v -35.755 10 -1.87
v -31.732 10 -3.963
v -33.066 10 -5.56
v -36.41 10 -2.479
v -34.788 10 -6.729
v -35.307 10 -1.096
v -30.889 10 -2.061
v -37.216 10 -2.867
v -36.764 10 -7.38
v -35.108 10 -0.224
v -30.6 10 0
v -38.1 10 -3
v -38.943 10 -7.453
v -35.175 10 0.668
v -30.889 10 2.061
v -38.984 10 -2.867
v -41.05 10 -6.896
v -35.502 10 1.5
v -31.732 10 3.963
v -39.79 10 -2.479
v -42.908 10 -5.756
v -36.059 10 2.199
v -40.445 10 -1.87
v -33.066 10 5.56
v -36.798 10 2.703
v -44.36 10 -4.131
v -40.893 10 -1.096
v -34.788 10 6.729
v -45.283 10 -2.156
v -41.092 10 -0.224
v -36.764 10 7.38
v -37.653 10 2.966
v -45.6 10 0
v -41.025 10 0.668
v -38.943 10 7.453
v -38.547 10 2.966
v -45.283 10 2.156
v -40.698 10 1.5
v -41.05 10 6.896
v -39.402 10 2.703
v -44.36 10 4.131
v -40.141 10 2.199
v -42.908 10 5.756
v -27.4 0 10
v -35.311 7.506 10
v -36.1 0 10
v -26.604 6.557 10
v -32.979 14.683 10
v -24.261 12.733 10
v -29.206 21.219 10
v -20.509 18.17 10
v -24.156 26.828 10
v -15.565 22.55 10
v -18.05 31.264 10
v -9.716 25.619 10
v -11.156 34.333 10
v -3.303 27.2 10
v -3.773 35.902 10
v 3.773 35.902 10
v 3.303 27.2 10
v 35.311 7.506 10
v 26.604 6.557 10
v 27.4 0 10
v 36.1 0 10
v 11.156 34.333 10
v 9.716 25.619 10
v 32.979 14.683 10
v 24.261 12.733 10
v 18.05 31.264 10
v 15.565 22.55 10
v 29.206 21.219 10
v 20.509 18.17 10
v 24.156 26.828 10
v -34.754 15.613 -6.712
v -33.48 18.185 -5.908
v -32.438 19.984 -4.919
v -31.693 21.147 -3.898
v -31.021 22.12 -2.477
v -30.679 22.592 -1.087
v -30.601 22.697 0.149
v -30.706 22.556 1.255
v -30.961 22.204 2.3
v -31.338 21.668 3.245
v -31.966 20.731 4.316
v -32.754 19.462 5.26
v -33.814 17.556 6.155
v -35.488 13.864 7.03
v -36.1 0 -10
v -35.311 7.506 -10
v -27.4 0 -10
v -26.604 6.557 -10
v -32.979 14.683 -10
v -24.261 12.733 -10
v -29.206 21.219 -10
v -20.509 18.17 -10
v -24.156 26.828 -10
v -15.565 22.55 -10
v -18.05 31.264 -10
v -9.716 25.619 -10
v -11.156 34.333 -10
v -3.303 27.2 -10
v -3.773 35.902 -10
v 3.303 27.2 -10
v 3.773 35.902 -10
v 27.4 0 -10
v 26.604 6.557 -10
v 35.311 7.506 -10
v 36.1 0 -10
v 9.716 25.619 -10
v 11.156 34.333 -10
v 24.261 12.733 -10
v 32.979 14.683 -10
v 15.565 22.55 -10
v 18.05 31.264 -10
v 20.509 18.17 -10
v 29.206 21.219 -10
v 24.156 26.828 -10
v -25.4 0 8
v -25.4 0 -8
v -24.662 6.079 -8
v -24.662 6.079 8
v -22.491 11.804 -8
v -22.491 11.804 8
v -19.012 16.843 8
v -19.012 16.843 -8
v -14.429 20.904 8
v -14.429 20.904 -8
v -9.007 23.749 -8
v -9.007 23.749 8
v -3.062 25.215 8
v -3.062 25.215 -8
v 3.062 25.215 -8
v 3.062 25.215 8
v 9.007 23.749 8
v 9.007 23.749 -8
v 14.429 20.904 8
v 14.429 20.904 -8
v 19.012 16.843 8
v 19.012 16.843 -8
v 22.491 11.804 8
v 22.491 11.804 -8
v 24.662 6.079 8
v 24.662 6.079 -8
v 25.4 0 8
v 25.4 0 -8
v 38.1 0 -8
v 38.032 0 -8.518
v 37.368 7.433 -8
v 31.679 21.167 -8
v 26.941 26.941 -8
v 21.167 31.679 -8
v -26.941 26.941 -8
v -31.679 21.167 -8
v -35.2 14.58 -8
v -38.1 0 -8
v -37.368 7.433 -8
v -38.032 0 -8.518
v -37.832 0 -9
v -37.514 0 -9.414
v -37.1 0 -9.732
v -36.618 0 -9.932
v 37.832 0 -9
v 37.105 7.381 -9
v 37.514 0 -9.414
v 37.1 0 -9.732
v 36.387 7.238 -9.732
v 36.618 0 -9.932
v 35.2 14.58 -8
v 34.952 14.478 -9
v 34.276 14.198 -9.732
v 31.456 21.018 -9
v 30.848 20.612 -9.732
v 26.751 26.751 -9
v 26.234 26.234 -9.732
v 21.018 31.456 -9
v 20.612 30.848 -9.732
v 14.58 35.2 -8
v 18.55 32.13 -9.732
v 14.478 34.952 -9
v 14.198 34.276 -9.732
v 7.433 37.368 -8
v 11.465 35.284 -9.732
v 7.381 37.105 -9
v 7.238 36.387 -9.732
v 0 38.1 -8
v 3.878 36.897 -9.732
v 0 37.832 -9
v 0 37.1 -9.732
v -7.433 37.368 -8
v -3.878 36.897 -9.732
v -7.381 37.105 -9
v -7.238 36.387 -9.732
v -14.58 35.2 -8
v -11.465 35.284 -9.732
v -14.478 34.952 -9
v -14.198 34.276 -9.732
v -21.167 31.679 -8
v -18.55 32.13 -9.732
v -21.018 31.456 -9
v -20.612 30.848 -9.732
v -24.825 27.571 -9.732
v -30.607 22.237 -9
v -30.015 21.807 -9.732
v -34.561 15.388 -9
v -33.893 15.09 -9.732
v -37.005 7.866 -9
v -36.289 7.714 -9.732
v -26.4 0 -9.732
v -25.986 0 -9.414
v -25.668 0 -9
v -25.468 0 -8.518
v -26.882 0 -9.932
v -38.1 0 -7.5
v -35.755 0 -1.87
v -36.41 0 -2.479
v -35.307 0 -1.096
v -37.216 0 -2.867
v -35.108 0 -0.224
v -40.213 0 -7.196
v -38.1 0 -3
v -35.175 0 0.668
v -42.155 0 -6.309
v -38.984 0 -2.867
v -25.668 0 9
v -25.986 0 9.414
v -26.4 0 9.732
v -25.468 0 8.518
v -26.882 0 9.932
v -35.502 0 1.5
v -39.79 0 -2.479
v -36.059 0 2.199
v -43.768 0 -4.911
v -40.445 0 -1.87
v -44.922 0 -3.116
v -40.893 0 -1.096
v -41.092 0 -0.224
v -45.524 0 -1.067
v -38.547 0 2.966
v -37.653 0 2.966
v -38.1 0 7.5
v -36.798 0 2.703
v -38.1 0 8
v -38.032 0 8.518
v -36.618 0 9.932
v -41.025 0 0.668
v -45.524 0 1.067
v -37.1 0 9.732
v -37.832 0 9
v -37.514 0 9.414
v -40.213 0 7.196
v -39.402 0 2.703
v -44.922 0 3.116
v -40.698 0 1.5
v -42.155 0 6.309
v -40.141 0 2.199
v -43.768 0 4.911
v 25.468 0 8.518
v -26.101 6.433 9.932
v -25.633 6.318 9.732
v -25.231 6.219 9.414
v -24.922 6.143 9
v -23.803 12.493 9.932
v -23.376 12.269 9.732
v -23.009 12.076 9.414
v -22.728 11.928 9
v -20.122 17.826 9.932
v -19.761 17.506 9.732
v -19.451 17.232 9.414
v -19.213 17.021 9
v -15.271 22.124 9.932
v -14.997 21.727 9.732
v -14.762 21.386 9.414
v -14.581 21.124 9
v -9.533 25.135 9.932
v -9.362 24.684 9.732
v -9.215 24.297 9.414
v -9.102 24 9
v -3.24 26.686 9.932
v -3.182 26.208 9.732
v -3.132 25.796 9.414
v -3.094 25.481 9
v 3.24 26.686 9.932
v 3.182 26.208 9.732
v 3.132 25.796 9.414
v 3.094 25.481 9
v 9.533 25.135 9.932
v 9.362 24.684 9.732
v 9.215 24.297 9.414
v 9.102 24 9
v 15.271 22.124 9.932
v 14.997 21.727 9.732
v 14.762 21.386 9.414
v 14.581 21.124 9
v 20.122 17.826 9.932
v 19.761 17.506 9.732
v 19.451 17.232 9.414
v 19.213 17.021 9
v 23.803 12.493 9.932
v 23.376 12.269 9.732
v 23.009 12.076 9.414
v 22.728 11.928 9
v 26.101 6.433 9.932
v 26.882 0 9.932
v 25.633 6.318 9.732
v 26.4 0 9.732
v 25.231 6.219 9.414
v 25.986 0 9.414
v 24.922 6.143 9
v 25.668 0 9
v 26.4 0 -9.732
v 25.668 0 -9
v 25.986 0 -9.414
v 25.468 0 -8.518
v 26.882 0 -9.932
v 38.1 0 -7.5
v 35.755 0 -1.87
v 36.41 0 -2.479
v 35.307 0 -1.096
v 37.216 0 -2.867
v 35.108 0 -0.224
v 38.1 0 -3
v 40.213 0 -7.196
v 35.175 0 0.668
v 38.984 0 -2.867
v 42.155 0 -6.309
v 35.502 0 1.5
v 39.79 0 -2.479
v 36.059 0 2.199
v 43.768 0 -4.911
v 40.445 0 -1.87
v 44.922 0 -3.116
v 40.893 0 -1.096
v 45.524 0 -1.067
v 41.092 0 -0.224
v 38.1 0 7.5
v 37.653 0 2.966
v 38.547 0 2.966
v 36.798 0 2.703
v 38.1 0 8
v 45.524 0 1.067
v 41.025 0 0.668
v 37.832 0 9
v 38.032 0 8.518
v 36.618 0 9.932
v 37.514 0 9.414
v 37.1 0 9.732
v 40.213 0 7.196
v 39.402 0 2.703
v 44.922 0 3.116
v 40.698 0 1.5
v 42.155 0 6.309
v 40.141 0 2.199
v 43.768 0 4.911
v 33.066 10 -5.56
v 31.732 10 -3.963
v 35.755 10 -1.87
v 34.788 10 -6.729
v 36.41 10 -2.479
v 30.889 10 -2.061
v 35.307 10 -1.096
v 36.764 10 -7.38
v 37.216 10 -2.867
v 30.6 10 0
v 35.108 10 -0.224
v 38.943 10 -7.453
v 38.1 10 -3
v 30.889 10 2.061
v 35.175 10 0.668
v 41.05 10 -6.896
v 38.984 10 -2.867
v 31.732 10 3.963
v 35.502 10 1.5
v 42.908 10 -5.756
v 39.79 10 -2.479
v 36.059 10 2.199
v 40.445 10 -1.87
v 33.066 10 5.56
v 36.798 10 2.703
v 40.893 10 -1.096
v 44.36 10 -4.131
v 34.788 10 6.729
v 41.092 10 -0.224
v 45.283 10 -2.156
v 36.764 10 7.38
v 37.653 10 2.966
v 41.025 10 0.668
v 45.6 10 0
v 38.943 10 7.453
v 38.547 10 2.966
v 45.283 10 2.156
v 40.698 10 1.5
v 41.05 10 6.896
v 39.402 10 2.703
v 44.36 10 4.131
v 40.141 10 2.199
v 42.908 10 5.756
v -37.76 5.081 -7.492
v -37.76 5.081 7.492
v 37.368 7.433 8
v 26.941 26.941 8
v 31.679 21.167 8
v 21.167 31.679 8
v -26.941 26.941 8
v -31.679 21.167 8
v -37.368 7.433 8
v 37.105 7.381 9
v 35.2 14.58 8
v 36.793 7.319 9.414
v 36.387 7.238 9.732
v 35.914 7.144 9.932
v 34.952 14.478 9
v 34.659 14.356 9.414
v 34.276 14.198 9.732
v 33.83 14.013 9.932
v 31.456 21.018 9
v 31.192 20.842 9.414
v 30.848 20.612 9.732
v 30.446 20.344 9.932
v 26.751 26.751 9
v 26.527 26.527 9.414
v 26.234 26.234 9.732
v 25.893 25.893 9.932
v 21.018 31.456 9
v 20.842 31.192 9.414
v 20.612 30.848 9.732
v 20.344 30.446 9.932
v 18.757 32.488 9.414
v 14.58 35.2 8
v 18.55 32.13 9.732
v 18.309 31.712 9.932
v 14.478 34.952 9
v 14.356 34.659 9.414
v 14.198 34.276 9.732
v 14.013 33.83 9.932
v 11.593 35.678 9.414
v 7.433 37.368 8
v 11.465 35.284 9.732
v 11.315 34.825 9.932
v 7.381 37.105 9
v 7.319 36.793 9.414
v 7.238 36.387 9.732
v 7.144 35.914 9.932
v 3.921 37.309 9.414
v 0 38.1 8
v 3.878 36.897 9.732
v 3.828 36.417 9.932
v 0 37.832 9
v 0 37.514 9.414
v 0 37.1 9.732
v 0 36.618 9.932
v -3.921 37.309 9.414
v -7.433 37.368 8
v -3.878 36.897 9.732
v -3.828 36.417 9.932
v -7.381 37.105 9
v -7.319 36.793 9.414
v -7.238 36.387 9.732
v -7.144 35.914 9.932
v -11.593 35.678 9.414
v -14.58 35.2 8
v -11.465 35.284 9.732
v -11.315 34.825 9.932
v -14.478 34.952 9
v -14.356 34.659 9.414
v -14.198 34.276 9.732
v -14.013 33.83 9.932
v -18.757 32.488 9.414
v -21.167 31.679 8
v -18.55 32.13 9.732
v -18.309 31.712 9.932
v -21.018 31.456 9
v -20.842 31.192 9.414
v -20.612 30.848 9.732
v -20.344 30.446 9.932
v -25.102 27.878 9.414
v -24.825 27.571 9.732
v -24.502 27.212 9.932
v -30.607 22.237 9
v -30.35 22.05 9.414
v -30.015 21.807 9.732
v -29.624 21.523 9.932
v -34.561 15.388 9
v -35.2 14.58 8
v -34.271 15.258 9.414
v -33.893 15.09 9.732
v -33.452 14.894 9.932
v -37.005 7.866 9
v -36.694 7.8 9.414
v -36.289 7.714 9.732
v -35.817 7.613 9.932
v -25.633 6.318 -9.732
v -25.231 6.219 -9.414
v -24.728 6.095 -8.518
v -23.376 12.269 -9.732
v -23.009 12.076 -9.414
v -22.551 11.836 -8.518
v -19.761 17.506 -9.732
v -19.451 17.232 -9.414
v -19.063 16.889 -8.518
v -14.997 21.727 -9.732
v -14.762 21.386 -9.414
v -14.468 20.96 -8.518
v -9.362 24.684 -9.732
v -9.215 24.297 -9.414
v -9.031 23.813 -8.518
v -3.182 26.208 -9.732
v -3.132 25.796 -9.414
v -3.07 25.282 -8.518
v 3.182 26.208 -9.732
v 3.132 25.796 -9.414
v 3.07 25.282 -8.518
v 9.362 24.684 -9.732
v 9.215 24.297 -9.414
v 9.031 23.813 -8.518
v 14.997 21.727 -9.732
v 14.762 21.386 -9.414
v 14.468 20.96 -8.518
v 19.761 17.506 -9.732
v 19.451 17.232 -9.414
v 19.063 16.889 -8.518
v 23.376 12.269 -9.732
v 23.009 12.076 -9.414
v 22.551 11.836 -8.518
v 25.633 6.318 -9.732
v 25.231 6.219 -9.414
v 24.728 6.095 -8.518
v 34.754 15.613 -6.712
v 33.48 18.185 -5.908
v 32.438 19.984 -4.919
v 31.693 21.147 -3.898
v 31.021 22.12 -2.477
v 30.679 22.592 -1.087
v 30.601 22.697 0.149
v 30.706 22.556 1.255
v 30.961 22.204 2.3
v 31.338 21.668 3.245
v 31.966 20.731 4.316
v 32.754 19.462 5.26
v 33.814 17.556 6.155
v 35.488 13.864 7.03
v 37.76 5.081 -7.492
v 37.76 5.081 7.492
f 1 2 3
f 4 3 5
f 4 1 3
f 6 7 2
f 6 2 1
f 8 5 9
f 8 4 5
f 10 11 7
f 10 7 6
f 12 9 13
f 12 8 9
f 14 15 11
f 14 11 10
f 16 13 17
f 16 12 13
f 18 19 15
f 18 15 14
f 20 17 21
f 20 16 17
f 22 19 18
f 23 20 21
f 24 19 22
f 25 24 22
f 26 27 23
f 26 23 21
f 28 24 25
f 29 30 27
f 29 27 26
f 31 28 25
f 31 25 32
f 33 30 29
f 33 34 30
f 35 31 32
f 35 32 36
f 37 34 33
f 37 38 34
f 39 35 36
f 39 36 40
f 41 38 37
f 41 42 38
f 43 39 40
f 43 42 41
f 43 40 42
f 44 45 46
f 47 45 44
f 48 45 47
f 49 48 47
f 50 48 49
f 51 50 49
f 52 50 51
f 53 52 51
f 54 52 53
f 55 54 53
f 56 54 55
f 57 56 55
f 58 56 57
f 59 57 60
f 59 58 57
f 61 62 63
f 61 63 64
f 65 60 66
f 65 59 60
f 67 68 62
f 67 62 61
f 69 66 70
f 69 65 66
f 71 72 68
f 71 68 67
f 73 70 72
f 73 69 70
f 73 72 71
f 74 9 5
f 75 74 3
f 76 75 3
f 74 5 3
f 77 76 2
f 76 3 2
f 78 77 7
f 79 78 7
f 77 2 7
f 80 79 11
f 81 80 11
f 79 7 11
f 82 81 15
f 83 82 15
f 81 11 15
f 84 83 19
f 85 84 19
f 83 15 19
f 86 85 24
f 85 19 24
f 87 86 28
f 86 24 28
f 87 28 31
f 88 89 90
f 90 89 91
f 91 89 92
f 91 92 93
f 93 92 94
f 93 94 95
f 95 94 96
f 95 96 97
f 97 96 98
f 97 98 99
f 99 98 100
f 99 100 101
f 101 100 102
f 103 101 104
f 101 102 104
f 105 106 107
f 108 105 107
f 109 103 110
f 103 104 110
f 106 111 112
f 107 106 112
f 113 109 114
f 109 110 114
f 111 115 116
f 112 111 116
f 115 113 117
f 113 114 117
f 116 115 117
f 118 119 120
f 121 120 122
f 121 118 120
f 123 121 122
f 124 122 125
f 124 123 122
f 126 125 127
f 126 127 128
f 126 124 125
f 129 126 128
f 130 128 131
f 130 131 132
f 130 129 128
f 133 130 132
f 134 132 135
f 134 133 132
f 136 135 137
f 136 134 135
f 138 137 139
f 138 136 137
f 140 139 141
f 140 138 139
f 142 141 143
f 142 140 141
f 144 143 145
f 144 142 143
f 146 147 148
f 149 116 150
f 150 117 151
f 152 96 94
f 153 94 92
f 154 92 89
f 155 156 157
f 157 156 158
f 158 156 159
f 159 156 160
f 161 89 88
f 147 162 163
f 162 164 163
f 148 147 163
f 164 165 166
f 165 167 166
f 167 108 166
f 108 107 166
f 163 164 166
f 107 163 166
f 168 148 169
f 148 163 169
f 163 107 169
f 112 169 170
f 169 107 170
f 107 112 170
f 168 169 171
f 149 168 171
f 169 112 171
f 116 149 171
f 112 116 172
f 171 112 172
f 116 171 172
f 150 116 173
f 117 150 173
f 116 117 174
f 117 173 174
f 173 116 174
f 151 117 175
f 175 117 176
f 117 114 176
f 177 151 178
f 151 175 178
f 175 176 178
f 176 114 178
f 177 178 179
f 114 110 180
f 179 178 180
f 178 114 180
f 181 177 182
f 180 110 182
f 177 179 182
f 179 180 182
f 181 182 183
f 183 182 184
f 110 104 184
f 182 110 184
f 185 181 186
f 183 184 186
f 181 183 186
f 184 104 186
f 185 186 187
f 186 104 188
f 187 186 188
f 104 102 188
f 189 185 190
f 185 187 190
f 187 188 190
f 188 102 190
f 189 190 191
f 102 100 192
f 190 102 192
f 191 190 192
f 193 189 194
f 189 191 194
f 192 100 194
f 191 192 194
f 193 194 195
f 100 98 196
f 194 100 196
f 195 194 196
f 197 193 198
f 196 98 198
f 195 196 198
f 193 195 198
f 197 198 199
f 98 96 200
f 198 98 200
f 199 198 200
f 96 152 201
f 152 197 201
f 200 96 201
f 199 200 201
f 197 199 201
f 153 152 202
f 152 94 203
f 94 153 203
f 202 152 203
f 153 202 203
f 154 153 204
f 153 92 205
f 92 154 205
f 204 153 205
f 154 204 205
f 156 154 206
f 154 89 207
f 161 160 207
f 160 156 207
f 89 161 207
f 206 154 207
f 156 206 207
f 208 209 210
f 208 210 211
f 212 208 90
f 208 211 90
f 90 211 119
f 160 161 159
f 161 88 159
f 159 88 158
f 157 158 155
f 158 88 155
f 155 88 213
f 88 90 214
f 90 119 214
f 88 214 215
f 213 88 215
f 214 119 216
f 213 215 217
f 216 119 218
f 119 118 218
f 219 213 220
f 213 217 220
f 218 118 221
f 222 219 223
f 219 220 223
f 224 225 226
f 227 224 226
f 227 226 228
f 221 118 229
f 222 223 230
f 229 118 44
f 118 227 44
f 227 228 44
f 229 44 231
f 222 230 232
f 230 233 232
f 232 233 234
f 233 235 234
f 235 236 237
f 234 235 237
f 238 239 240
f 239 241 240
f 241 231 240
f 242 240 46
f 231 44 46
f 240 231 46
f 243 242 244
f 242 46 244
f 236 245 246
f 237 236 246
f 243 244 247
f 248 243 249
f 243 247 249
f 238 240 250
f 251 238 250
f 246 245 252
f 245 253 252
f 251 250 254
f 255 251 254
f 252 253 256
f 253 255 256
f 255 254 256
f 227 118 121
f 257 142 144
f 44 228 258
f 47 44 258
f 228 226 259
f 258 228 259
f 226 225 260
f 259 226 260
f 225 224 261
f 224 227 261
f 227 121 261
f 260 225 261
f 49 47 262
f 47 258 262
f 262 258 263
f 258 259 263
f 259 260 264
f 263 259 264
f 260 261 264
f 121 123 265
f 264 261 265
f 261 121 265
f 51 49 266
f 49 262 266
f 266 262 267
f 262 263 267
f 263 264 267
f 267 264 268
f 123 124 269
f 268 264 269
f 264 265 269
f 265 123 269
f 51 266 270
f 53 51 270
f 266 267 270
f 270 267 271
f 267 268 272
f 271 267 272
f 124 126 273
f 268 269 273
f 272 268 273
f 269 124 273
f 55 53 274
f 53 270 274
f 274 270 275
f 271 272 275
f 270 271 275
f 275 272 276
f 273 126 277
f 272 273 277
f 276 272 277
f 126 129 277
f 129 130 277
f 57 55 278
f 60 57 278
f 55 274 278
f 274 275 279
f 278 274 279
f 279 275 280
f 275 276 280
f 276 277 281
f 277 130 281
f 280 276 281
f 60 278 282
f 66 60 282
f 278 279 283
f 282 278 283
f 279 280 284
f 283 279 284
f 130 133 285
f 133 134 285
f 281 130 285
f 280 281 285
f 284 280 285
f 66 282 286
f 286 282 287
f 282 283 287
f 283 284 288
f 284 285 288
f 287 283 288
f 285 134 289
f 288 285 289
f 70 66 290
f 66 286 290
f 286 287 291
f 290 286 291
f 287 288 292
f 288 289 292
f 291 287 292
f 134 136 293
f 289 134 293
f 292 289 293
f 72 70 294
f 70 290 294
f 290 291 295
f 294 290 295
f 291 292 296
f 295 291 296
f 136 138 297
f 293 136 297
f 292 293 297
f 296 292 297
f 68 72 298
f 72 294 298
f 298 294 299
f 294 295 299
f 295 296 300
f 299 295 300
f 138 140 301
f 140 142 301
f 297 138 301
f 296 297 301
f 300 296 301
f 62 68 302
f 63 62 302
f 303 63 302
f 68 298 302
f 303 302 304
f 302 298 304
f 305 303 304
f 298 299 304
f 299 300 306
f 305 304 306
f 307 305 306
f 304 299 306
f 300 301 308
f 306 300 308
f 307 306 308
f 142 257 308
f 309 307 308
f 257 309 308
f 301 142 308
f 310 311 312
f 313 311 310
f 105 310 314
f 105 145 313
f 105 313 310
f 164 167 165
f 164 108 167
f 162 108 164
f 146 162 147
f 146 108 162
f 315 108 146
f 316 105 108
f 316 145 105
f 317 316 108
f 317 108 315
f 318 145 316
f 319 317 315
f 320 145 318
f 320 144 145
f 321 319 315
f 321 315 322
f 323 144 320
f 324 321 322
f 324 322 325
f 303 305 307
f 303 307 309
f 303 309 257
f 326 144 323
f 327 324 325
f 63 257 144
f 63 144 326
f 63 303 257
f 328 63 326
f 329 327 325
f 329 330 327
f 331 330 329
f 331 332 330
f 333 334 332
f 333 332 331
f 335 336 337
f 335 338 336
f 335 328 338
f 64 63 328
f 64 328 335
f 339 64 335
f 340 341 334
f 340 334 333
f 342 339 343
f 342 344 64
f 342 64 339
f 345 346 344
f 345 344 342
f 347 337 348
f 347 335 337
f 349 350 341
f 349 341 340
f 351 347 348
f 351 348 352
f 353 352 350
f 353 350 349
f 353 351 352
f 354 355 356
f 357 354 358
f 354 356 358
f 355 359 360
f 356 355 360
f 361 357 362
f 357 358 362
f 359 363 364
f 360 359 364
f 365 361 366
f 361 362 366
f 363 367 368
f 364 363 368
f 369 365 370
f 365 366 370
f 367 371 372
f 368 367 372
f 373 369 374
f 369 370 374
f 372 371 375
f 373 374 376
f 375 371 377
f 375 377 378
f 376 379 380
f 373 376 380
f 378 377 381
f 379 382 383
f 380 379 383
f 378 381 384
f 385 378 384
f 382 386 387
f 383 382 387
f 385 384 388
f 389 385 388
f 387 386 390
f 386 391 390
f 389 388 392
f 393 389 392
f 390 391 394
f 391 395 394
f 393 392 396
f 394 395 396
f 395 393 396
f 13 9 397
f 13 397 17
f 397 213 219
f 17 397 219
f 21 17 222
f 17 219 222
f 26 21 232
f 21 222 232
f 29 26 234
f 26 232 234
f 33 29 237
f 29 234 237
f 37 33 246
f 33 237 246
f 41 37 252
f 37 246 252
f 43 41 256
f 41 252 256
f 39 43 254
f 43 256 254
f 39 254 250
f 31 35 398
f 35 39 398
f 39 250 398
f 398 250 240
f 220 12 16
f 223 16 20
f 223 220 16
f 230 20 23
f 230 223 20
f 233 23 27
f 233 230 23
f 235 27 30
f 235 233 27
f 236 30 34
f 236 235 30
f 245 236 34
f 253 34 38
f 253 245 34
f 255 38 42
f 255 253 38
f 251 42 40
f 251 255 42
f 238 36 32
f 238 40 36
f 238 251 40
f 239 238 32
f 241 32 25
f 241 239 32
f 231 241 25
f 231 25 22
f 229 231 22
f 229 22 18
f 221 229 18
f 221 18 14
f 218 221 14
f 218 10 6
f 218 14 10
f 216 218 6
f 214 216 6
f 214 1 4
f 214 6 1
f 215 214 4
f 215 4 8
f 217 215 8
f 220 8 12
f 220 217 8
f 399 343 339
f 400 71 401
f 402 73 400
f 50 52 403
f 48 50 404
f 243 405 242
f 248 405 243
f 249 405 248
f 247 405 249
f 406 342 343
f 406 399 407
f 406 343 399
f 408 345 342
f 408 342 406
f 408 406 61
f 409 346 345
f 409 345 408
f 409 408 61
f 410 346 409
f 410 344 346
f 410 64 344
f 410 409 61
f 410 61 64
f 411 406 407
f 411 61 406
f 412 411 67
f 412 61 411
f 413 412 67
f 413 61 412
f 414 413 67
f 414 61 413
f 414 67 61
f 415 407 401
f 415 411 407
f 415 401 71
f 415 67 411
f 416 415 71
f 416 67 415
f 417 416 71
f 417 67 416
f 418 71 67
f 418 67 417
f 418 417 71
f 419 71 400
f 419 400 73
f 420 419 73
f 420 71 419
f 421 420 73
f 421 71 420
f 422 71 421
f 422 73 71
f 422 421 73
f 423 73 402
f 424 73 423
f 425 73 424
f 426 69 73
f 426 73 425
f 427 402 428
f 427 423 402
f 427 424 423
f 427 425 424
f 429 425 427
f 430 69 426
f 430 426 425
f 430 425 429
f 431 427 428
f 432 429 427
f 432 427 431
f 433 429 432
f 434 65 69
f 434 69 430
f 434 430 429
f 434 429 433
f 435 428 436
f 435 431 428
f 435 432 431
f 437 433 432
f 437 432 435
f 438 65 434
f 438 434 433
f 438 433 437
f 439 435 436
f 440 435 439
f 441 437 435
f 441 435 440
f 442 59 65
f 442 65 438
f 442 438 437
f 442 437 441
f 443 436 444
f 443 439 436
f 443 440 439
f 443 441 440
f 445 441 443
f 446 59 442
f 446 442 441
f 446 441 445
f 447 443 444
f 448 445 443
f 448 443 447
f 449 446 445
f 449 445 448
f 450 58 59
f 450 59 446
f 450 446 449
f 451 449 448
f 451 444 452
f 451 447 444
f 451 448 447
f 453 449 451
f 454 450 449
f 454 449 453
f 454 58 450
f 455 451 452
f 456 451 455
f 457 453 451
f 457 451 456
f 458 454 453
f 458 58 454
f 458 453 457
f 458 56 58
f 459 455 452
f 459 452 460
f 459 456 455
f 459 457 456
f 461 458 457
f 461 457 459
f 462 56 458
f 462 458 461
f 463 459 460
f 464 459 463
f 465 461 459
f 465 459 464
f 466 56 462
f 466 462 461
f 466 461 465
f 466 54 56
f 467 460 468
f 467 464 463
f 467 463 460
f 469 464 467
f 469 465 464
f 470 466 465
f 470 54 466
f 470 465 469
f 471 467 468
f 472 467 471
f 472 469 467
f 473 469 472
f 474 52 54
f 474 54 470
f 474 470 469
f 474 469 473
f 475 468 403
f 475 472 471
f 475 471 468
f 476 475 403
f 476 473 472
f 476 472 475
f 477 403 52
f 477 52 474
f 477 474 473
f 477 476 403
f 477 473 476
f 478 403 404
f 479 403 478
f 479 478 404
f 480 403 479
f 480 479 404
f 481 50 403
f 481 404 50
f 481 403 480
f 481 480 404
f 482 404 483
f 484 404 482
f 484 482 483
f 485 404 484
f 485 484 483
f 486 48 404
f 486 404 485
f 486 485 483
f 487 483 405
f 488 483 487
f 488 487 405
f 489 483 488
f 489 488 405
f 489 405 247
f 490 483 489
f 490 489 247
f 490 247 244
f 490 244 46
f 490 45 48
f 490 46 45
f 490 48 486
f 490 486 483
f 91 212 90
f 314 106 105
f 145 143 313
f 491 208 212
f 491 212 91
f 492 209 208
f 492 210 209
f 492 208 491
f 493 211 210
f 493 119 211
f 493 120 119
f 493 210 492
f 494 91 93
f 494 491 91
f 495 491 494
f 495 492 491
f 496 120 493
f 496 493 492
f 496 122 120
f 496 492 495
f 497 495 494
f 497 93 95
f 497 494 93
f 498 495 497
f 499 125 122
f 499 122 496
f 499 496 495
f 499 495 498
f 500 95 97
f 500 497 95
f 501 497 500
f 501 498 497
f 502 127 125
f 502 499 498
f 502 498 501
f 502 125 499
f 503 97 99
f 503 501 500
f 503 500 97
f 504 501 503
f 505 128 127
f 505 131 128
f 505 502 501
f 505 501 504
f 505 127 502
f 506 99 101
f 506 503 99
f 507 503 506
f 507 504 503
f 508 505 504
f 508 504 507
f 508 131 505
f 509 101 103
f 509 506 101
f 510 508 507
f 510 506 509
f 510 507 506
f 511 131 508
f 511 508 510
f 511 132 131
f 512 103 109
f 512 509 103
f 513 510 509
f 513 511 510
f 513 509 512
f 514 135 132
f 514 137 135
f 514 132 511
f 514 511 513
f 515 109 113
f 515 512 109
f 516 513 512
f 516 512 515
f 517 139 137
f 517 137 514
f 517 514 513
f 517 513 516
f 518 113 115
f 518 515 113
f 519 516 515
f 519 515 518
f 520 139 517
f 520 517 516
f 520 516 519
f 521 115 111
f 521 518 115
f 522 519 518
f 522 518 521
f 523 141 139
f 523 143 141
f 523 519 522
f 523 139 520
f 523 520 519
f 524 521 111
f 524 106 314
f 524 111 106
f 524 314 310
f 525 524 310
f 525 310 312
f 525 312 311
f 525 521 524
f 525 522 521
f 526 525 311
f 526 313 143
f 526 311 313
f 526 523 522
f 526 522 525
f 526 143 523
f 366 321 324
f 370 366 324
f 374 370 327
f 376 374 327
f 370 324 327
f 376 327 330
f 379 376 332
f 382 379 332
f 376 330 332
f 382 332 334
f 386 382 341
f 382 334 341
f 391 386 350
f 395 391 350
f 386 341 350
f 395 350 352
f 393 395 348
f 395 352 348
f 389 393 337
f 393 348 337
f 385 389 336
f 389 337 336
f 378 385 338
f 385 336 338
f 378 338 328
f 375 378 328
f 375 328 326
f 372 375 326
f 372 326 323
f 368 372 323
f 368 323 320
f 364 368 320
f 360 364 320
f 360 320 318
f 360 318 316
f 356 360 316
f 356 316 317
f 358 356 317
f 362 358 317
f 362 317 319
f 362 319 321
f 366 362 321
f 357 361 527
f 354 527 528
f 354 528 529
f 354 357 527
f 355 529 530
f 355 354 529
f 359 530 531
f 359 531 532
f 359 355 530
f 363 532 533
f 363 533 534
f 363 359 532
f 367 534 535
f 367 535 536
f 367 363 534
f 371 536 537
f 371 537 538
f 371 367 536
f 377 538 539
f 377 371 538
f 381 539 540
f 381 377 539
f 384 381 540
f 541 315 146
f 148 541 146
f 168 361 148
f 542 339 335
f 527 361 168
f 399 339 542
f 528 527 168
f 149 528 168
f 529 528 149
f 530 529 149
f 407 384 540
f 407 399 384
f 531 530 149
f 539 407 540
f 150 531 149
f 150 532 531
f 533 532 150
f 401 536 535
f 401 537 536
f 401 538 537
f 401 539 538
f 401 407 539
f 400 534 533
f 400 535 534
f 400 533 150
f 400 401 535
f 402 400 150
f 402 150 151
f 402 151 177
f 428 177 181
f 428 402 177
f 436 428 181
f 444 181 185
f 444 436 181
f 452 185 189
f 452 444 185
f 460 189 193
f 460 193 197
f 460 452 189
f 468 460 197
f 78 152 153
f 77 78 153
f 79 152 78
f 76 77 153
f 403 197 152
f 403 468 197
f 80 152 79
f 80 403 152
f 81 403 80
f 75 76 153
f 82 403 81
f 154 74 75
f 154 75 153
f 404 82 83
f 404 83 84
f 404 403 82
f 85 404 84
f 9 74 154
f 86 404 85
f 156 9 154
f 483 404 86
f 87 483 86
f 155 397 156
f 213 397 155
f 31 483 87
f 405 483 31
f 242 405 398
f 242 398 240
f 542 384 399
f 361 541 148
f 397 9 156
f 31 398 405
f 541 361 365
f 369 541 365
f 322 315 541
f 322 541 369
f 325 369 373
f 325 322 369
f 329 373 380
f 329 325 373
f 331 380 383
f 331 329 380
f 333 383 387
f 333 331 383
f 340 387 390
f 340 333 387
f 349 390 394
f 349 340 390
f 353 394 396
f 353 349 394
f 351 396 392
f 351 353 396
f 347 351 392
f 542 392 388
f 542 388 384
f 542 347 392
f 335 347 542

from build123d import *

# Parameters (mm, degrees)
BOSS_EXTRUDE1_DEPTH = 10
SKETCH2_R           = 7.5
BOSS_EXTRUDE4_DEPTH = 10
SKETCH3_R           = 7.5
CUT_EXTRUDE1_DEPTH  = 60
SKETCH4_R           = 3
CUT_EXTRUDE2_DEPTH  = 60
FILLET1_R           = 2


with BuildPart() as part:
    # Sketch1 → Boss-Extrude1 (new, symmetric)
    with BuildSketch(Plane.XY):
        with BuildLine():
            Line((-38.1, 0), (-25.4, 0))
            ThreePointArc((-25.4, 0), (0, 25.4), (25.4, 0))
            Line((25.4, 0), (38.1, 0))
            ThreePointArc((38.1, 0), (0, 38.1), (-38.1, 0))
        make_face()
    extrude(amount=BOSS_EXTRUDE1_DEPTH, both=True)

    # Sketch2 → Boss-Extrude4 (add)
    with BuildSketch(Plane.XZ):
        with Locations((38.1, 0)):
            Circle(SKETCH2_R)
    boss_extrude4 = extrude(amount=-BOSS_EXTRUDE4_DEPTH)

    # Sketch3 → Cut-Extrude1 (cut)
    with BuildSketch(Plane(origin=(0, 10, 0), x_dir=(1, 0, 0), z_dir=(0, 1, 0))):
        with Locations((38.1, 0)):
            Circle(SKETCH3_R)
    cut_extrude1 = extrude(amount=CUT_EXTRUDE1_DEPTH, mode=Mode.SUBTRACT)

    # Sketch4 → Cut-Extrude2 (cut)
    with BuildSketch(Plane.XZ):
        with Locations(Location((38.1, 0, 0), (0, 0, 270))):
            Circle(SKETCH4_R)
    cut_extrude2 = extrude(amount=-CUT_EXTRUDE2_DEPTH, mode=Mode.SUBTRACT)

    # Mirror1: Boss-Extrude4, Cut-Extrude1, Cut-Extrude2 across plane
    add(boss_extrude4.mirror(Plane(origin=(0, 0, 0), x_dir=(0, 0, 1), z_dir=(1, 0, 0))))
    add(cut_extrude1.mirror(Plane(origin=(0, 0, 0), x_dir=(0, 0, 1), z_dir=(1, 0, 0))), mode=Mode.SUBTRACT)
    add(cut_extrude2.mirror(Plane(origin=(0, 0, 0), x_dir=(0, 0, 1), z_dir=(1, 0, 0))), mode=Mode.SUBTRACT)

    # Fillet1
    fillet1_edges = [part.edges().sort_by_distance(p)[0] for p in [
        (0, 38.1, 10),
        (0, 25.4, 10),
        (0, 38.1, -10),
        (0, 25.4, -10),
    ]]
    fillet(fillet1_edges, radius=FILLET1_R)


solid = part.part
